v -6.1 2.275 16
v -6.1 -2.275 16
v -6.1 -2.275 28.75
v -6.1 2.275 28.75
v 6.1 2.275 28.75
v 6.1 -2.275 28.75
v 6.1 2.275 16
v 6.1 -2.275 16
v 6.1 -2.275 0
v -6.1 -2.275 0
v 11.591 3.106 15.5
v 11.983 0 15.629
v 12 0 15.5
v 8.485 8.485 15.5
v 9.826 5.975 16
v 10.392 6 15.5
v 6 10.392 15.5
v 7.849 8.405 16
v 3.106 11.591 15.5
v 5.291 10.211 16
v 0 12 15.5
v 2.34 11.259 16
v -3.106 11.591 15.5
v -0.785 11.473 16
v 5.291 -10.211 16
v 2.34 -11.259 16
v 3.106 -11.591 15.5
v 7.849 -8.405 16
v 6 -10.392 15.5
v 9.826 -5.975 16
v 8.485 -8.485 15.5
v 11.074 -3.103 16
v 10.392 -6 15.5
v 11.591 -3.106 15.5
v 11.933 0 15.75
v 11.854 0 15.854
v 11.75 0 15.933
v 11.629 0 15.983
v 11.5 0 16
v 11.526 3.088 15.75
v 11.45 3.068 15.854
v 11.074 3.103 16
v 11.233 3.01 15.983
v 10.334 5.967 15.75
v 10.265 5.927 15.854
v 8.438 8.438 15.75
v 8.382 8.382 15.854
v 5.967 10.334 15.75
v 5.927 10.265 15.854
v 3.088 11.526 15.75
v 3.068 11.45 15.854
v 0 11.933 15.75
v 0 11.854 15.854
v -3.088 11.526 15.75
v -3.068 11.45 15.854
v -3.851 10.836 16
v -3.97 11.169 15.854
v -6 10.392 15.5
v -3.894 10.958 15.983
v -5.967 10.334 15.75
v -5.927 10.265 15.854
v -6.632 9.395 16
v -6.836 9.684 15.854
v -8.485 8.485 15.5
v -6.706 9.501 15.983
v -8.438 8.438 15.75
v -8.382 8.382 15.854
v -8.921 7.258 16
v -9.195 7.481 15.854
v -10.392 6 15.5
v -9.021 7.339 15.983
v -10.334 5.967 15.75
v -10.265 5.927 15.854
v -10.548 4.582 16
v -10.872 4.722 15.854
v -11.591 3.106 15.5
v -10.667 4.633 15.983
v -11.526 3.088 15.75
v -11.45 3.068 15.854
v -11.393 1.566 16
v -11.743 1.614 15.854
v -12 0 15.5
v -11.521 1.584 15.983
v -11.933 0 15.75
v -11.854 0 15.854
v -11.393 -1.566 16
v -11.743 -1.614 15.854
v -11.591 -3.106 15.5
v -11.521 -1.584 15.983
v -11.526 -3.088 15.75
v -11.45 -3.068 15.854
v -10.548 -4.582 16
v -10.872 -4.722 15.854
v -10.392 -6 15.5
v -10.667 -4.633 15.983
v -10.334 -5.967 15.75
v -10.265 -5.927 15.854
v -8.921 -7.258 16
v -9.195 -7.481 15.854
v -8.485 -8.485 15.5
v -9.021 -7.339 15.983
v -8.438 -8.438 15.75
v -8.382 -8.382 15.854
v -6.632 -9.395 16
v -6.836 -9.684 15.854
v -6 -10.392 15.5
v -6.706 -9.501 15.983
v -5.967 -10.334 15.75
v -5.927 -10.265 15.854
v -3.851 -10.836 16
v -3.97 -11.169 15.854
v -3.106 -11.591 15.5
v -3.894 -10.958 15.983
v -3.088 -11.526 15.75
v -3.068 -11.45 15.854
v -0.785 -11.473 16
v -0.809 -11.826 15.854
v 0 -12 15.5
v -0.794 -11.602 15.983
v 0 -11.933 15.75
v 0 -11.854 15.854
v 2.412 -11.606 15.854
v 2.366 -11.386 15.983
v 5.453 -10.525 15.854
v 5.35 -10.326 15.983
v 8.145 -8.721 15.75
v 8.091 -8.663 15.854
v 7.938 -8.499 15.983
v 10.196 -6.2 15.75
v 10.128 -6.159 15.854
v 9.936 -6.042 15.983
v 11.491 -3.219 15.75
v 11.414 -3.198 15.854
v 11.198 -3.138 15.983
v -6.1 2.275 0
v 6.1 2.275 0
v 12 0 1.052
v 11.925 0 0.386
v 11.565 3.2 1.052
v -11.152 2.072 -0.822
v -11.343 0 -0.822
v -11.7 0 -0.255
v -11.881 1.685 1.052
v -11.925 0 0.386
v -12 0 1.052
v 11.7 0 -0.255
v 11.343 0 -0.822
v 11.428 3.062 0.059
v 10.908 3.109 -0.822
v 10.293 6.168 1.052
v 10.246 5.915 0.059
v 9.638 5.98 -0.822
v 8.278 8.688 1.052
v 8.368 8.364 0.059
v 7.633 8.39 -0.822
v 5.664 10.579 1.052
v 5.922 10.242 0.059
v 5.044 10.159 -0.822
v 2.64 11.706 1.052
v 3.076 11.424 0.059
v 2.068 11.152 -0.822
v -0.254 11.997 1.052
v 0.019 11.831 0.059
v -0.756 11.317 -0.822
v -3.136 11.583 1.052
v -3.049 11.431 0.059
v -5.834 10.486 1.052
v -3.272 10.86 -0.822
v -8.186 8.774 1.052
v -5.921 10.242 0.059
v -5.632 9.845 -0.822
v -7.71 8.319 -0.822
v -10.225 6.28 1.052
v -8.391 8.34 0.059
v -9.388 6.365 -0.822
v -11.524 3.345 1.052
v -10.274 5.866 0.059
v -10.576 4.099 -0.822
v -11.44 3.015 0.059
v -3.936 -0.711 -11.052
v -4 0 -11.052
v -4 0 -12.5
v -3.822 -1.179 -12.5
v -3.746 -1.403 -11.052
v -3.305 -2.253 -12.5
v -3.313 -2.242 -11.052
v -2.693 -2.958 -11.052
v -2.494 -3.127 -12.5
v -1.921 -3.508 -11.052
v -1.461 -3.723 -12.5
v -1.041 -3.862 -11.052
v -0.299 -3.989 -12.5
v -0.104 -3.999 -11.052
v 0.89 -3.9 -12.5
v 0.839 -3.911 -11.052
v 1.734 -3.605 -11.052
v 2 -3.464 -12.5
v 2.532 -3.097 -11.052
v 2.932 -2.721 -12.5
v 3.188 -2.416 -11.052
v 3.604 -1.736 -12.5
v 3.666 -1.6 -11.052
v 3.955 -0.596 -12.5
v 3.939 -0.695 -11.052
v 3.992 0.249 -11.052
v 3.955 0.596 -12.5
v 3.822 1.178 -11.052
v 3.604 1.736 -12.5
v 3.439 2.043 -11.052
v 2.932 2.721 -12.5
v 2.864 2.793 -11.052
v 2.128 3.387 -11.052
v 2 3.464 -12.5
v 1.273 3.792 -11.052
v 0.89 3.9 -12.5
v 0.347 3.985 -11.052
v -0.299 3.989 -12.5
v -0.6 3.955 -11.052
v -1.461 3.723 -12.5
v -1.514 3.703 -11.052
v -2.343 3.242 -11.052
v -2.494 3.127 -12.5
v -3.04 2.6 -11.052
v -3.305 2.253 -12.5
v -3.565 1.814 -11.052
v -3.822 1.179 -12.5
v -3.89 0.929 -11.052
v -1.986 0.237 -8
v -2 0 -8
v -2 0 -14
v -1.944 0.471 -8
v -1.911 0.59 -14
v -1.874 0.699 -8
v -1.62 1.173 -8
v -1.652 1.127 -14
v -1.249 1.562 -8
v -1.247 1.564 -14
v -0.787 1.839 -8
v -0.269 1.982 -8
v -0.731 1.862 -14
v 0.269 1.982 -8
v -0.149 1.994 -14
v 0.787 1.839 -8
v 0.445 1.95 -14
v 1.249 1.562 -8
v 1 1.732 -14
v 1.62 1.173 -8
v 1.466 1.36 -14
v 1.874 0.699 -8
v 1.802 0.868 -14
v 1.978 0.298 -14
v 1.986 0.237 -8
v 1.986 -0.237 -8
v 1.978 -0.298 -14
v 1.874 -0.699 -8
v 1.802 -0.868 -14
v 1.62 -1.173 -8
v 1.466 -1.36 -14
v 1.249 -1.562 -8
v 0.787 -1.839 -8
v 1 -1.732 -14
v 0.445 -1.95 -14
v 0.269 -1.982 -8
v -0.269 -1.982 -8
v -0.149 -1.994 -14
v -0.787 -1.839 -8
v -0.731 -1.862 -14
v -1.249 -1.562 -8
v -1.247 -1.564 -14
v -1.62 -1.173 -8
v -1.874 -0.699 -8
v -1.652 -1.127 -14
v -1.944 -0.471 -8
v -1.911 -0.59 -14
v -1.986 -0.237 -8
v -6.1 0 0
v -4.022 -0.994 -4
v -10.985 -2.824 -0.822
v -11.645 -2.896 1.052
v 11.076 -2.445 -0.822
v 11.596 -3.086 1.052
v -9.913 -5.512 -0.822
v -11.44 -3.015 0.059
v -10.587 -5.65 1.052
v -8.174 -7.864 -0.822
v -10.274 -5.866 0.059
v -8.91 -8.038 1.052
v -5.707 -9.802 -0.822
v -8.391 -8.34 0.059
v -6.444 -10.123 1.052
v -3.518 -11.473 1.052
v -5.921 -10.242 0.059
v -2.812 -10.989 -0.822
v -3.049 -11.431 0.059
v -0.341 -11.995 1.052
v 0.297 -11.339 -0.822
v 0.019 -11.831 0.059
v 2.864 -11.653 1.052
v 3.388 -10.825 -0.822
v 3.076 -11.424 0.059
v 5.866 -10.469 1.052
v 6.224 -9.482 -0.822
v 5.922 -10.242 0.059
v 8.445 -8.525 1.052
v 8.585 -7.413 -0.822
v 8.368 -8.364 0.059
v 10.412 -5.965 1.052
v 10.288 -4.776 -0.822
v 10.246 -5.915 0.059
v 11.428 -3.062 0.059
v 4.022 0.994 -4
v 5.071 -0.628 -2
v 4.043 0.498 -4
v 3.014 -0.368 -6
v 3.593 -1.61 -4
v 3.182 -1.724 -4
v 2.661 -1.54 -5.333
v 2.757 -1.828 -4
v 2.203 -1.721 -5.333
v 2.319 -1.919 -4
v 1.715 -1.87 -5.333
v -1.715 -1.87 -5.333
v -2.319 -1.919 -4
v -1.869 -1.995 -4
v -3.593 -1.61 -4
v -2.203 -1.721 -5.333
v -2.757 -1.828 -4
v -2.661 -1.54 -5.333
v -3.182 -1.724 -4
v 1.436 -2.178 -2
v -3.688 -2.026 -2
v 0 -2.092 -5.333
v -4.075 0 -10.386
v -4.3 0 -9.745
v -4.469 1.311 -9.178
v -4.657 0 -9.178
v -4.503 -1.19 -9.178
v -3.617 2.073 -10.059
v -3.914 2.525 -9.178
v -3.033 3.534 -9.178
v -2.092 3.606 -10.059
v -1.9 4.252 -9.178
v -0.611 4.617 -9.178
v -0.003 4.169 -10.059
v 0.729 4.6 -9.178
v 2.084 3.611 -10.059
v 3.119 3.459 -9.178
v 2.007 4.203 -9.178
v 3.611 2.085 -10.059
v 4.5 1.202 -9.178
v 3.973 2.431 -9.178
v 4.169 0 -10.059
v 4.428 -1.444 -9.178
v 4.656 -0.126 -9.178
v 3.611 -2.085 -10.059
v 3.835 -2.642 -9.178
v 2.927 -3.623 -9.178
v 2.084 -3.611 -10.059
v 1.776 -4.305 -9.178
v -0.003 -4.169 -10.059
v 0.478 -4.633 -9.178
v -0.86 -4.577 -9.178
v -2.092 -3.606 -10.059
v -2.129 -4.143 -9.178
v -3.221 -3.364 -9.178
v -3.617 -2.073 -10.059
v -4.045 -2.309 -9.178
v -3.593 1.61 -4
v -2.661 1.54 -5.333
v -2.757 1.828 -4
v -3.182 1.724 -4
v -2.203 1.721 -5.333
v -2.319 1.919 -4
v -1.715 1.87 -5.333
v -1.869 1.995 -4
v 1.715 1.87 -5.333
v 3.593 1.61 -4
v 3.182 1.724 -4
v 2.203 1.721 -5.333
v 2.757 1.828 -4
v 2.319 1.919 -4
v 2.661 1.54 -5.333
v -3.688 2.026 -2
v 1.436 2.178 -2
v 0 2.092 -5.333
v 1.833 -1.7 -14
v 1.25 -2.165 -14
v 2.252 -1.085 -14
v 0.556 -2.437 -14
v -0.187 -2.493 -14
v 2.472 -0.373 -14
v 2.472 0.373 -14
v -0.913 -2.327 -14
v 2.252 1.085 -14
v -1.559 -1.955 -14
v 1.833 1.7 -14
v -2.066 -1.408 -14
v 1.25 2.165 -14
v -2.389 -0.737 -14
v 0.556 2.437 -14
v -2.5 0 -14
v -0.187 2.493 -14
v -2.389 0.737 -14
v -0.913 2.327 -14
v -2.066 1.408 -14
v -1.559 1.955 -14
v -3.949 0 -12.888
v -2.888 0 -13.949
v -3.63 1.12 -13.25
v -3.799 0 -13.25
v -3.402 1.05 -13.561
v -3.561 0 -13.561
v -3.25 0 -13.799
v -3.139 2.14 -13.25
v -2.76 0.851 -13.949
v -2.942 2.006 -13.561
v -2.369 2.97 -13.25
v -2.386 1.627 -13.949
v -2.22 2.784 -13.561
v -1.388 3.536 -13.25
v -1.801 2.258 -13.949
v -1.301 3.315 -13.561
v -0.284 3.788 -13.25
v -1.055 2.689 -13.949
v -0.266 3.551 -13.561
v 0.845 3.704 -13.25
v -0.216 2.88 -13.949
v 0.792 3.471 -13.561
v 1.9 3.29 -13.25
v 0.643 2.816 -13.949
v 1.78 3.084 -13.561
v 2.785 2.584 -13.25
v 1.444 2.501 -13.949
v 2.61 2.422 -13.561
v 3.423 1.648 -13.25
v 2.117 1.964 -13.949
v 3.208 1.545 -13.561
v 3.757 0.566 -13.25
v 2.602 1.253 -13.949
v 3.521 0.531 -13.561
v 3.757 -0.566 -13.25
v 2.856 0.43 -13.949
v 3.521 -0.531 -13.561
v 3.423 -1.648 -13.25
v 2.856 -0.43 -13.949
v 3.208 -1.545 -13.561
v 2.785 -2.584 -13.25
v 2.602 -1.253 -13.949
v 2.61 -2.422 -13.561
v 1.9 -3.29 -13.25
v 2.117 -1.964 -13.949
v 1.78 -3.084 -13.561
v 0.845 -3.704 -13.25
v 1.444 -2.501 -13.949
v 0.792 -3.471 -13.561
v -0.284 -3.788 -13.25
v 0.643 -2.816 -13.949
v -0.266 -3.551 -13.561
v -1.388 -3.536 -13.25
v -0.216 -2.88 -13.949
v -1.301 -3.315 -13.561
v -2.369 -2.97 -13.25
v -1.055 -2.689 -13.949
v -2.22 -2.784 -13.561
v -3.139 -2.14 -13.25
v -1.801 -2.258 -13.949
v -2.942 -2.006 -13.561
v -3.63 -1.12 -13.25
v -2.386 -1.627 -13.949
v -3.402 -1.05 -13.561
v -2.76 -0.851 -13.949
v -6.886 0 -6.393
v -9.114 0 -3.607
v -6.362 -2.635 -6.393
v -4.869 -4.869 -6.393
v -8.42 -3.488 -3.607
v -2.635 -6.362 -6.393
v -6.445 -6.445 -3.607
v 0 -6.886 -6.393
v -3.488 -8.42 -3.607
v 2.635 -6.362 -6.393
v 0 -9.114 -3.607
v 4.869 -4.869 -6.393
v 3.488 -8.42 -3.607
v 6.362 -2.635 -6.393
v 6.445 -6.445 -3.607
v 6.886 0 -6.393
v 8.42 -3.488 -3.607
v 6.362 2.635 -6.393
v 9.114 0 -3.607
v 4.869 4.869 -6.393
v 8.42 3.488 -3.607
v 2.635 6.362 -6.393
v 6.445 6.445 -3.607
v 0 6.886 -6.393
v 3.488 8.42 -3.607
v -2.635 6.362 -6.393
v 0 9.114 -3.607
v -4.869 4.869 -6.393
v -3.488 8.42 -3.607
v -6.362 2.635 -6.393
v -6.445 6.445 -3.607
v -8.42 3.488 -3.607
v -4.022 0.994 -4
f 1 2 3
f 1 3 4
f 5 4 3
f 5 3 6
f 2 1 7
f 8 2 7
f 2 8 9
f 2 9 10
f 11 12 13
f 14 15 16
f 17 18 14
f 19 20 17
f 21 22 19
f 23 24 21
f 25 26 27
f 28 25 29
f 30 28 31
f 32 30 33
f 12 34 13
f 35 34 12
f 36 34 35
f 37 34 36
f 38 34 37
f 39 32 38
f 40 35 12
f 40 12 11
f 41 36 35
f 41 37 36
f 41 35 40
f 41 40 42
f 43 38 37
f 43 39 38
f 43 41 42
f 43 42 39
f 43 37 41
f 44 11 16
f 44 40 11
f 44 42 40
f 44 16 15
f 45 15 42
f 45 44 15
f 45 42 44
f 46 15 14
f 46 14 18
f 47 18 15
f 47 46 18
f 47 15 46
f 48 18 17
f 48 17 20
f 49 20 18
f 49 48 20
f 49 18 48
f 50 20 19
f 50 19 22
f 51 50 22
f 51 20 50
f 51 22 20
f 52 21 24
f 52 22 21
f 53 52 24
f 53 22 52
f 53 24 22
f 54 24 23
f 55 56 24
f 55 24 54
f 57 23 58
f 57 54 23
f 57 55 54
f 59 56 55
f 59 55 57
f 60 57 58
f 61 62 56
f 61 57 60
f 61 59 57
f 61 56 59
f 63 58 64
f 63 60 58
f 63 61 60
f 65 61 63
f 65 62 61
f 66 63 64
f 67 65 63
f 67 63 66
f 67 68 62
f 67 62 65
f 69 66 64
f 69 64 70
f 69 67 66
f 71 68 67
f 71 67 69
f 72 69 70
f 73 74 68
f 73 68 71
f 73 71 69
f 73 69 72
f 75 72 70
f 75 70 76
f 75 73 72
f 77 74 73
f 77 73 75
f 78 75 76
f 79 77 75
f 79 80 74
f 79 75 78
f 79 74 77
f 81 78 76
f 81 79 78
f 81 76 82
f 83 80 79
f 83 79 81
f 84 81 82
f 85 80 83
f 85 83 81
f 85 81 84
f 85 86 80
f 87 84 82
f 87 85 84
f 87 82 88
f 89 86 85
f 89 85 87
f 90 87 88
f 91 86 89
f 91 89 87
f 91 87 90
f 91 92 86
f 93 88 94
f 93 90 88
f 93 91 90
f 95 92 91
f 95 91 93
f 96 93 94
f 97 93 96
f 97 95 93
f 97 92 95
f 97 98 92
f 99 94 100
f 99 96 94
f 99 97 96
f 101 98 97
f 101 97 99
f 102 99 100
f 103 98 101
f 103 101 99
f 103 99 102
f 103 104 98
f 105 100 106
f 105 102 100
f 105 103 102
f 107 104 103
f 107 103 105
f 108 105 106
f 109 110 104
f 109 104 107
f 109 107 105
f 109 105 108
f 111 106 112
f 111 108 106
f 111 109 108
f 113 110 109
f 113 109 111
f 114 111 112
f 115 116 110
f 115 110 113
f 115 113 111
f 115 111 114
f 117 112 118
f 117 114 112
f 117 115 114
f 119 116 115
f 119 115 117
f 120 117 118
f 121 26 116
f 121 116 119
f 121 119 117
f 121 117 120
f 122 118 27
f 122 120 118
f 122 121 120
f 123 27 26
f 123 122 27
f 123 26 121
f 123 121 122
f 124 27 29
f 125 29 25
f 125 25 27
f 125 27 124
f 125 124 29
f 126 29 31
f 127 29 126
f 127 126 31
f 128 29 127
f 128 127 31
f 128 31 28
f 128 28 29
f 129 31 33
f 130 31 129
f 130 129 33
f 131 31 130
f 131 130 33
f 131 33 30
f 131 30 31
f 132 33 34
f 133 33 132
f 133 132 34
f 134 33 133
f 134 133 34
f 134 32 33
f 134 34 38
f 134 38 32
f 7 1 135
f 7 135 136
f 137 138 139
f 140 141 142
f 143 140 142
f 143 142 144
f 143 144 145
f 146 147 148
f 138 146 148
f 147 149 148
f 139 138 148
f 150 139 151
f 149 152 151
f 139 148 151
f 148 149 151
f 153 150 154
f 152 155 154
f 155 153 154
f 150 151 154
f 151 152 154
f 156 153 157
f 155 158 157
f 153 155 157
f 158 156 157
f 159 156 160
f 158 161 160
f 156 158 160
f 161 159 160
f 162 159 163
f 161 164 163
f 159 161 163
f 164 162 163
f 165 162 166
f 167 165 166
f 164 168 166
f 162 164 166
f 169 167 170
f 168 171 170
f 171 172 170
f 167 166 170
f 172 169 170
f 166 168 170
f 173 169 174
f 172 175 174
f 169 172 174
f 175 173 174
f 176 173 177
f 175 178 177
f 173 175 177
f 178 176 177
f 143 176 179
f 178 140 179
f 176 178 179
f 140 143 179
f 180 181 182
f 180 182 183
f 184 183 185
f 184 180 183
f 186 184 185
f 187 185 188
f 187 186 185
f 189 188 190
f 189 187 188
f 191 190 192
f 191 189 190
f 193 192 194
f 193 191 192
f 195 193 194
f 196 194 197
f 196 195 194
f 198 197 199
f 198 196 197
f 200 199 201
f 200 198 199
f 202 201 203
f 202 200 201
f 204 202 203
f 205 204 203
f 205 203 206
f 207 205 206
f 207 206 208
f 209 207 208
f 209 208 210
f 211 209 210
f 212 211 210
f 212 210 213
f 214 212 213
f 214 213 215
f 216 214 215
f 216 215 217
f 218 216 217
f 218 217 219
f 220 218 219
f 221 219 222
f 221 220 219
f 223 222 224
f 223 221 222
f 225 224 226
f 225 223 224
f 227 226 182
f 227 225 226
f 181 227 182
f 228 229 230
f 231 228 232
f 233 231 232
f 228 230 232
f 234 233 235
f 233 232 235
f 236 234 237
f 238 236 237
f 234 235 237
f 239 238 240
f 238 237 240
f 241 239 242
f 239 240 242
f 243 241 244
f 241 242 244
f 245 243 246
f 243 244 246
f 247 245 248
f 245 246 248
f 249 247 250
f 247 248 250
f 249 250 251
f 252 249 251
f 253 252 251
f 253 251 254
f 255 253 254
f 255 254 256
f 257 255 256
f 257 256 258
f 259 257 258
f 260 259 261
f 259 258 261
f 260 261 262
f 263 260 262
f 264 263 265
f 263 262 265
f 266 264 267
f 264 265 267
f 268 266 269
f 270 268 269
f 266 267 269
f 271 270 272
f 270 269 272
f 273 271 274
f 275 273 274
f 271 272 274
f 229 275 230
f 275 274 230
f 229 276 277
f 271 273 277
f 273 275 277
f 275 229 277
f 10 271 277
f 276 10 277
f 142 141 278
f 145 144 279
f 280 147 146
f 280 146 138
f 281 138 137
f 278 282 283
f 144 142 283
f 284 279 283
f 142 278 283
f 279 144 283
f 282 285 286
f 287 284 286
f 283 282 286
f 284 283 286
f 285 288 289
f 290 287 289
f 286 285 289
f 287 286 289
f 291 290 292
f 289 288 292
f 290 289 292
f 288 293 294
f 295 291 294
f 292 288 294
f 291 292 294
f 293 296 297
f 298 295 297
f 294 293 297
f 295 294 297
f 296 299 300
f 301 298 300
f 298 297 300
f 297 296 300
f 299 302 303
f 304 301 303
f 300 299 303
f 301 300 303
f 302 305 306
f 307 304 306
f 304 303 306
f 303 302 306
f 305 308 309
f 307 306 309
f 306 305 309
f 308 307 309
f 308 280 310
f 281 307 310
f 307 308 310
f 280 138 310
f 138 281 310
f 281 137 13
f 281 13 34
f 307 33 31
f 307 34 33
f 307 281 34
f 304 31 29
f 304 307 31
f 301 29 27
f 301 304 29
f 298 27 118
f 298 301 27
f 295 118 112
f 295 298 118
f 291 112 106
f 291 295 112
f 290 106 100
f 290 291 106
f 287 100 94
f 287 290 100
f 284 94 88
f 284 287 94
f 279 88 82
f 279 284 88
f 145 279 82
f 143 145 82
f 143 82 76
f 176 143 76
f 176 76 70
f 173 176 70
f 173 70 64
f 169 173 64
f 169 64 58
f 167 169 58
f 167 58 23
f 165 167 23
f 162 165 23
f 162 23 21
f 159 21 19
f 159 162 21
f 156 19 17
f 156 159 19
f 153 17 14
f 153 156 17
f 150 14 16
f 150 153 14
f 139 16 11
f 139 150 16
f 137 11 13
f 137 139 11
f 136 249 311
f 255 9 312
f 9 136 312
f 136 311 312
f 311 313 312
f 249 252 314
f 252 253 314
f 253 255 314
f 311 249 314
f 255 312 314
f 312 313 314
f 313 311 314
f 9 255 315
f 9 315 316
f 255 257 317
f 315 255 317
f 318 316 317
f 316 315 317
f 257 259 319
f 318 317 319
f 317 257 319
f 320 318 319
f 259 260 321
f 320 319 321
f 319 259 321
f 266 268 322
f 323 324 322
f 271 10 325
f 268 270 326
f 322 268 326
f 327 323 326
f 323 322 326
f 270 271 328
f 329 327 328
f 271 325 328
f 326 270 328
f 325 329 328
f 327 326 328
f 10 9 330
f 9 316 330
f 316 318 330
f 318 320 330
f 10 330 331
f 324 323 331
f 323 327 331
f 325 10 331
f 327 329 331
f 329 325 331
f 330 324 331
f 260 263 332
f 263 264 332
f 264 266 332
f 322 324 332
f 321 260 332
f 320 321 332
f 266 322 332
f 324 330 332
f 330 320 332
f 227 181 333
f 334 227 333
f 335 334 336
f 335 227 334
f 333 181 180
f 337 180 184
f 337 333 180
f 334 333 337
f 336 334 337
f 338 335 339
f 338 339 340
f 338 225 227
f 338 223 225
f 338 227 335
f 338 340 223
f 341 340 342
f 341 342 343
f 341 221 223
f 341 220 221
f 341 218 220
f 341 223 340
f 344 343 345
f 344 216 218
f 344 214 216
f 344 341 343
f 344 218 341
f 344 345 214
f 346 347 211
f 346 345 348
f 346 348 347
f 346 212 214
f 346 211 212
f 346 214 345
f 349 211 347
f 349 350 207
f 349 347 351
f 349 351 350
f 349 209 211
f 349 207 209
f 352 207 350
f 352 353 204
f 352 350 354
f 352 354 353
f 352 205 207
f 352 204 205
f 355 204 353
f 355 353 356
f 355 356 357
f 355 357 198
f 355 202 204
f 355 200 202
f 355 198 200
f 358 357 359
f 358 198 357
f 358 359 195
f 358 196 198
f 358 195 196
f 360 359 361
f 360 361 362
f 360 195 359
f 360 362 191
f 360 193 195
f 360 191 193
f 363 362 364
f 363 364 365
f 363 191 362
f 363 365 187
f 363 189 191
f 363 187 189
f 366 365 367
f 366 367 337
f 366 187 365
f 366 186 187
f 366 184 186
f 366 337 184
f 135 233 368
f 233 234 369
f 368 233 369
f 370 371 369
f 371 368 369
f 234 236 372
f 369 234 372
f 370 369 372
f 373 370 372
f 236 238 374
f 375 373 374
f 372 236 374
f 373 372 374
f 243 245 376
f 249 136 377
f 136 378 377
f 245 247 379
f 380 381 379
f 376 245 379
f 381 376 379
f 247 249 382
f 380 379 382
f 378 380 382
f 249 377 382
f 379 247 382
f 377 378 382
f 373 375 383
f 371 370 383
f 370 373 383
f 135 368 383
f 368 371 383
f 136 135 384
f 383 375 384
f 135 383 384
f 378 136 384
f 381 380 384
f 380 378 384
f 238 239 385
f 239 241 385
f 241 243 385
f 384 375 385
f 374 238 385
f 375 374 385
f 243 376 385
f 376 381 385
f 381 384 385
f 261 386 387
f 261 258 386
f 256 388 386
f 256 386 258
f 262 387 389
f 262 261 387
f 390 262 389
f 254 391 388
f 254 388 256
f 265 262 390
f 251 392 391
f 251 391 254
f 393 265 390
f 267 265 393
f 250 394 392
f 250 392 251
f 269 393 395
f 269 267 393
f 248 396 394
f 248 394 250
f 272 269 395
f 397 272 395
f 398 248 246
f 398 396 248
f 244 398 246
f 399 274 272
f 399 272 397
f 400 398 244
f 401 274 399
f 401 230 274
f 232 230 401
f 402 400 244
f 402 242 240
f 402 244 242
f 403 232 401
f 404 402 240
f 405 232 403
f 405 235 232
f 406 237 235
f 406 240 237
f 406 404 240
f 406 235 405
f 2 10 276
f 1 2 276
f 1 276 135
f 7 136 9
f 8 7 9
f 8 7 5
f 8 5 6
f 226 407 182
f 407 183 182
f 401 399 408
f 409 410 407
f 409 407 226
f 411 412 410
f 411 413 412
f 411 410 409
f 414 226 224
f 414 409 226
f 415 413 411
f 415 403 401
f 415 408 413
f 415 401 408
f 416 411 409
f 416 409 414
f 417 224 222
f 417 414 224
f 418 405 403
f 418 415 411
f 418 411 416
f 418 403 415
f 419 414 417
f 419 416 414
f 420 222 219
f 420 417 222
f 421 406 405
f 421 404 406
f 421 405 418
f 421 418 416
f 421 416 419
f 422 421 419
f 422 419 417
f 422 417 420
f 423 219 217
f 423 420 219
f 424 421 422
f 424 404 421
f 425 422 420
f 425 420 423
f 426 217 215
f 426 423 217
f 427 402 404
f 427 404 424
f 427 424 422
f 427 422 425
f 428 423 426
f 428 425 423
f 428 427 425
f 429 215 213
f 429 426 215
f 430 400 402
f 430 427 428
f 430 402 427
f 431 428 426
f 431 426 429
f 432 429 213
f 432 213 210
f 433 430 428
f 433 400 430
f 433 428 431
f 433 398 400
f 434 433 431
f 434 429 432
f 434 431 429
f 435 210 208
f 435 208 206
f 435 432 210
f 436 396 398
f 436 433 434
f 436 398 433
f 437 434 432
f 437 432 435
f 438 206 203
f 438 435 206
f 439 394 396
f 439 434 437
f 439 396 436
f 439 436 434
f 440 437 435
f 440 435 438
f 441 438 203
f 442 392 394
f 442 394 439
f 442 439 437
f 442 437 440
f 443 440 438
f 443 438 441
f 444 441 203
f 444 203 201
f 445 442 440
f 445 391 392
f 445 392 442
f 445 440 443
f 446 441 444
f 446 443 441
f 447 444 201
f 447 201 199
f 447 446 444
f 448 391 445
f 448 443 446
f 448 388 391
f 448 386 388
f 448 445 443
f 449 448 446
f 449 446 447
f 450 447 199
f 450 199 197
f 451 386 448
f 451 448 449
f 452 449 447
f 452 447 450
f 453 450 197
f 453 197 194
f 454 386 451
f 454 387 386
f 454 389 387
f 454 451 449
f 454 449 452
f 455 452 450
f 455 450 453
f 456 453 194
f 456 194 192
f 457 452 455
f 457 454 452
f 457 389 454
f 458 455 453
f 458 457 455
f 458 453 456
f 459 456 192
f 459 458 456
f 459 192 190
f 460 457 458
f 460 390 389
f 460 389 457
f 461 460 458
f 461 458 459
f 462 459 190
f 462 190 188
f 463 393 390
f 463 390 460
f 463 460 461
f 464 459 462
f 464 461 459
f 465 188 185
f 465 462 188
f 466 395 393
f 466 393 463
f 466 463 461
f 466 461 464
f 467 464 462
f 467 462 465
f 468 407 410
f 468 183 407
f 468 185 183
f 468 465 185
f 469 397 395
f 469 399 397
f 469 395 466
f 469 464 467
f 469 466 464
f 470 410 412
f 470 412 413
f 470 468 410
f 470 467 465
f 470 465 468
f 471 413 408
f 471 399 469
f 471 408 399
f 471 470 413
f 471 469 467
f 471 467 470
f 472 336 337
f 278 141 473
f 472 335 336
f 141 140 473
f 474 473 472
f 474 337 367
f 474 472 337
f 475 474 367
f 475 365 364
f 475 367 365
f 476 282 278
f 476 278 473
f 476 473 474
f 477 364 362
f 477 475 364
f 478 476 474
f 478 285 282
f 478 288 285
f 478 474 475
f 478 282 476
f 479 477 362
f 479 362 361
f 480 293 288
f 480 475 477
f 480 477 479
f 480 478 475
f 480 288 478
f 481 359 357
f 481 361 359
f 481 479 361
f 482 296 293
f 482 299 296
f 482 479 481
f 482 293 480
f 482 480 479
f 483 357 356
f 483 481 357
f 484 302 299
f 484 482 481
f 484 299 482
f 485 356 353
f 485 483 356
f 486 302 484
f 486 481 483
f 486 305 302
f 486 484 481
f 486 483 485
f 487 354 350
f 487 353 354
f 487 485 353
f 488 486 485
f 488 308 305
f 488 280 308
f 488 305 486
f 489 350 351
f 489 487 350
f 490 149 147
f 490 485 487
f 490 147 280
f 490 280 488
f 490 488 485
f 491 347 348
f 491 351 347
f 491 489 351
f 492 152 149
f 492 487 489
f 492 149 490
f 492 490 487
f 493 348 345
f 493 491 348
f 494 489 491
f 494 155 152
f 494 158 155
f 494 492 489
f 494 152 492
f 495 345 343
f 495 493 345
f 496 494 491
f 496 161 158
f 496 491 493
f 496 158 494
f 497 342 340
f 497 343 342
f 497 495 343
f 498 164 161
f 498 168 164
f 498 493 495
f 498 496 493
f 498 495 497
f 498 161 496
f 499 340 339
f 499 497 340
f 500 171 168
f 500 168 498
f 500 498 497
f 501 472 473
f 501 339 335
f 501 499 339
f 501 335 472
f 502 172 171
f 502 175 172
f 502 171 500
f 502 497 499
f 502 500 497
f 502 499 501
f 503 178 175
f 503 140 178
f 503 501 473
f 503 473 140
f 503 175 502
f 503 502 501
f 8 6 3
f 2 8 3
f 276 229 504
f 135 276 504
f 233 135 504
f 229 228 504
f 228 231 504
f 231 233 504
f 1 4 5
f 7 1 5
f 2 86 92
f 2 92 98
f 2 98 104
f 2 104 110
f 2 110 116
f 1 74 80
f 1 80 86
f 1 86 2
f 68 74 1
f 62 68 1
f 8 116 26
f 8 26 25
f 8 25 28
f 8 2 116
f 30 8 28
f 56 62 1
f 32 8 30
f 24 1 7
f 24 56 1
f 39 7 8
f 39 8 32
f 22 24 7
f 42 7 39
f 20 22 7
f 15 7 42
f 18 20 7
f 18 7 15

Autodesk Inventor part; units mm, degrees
ref_plane "YZ Plane" through (0, 0, 0) normal (1, 0, 0) x (0, 1, 0)
ref_plane "XZ Plane" through (0, 0, 0) normal (0, 1, 0) x (-1, 0, 0)
ref_plane "XY Plane" through (0, 0, 0) normal (0, 0, 1) x (1, 0, 0)
sketch "Sketch1" plane through (0, 0, 0) normal (0, 0, 1) x (1, 0, 0)
  circle A0 centre (0, 0) radius 12
  line L0 (-6.1, 2.275) -> (6.1, 2.275)
  line L1 (6.1, 2.275) -> (6.1, -2.275)
  line L2 (6.1, -2.275) -> (-6.1, -2.275)
  line L3 (-6.1, -2.275) -> (-6.1, 2.275)
  dimension "d0" = 12.2
  dimension "d1" = 4.55
  dimension "d2" = 2.275
  dimension "d3" = 6.1
  dimension "d4" = 24
extrude "Extrusion1" add sketch "Sketch1" along normal blind 16
ref_plane "Work Plane1" through (0, 0, -10) normal (0, 0, -1) x (-1, 0, 0)
sketch "Sketch4" plane through (0, 0, -10) normal (0, 0, -1) x (-1, 0, 0)
  circle A0 centre (0, 0) radius 4
  dimension "d11" = 8
extrude "Extrusion3" add sketch "Sketch4" along normal blind 4
sketch "Sketch6" plane through (0, 0, 0) normal (0, 0, -1) x (-1, 0, 0)
  circle A0 centre (0, 0) radius 12
loft "Loft1" add profiles "Sketch6" section 2 edges at (4, 0, -10)
sketch "Sketch7" plane through (0, 0, -14) normal (0, 0, -1) x (-1, 0, 0)
  circle A0 centre (0, 0) radius 4 projected
  circle A1 centre (0, 0) radius 2
  dimension "d18" = 4
extrude "Extrusion4" cut sketch "Sketch7" against normal blind 6 contours A1
loft "Loft2" cut section 1 edges at (-6.1, 0, 0) (0, -2.275, 0) (6.1, 0, 0) (0, 2.275, 0) section 2 edges at (2, 0, -8)
fillet "Fillet1" radius 1.5 1 edges at (4, 0, -14)
fillet "Fillet2" radius 3 1 edges at (4, 0, -10)
fillet "Fillet3" radius 3 2 edges at (0, 12, 0) (0, -12, 0)
fillet "Fillet4" radius 0.5 1 edges at (-12, 0, 16)
sketch "Sketch8" plane through (0, 0, 16) normal (0, 0, 1) x (1, 0, 0)
  line L0 (-6.1, 2.275) -> (6.1, 2.275) projected
  line L1 (6.1, -2.275) -> (-6.1, -2.275) projected
  line L2 (-6.1, 2.275) -> (6.1, 2.275)
  line L3 (6.1, 2.275) -> (6.1, -2.275)
  line L4 (6.1, -2.275) -> (-6.1, -2.275)
  line L5 (-6.1, -2.275) -> (-6.1, 2.275)
  point P0 (0, 0)
  point P1 (-6.1, -2.275)
extrude "Extrusion5" add sketch "Sketch8" along normal blind 12.75
equation "\"d2\" = 0.5 * d1"
equation "\"d3\" = 0.5 * d0"
properties part number "MainHousing_DataPlug"
